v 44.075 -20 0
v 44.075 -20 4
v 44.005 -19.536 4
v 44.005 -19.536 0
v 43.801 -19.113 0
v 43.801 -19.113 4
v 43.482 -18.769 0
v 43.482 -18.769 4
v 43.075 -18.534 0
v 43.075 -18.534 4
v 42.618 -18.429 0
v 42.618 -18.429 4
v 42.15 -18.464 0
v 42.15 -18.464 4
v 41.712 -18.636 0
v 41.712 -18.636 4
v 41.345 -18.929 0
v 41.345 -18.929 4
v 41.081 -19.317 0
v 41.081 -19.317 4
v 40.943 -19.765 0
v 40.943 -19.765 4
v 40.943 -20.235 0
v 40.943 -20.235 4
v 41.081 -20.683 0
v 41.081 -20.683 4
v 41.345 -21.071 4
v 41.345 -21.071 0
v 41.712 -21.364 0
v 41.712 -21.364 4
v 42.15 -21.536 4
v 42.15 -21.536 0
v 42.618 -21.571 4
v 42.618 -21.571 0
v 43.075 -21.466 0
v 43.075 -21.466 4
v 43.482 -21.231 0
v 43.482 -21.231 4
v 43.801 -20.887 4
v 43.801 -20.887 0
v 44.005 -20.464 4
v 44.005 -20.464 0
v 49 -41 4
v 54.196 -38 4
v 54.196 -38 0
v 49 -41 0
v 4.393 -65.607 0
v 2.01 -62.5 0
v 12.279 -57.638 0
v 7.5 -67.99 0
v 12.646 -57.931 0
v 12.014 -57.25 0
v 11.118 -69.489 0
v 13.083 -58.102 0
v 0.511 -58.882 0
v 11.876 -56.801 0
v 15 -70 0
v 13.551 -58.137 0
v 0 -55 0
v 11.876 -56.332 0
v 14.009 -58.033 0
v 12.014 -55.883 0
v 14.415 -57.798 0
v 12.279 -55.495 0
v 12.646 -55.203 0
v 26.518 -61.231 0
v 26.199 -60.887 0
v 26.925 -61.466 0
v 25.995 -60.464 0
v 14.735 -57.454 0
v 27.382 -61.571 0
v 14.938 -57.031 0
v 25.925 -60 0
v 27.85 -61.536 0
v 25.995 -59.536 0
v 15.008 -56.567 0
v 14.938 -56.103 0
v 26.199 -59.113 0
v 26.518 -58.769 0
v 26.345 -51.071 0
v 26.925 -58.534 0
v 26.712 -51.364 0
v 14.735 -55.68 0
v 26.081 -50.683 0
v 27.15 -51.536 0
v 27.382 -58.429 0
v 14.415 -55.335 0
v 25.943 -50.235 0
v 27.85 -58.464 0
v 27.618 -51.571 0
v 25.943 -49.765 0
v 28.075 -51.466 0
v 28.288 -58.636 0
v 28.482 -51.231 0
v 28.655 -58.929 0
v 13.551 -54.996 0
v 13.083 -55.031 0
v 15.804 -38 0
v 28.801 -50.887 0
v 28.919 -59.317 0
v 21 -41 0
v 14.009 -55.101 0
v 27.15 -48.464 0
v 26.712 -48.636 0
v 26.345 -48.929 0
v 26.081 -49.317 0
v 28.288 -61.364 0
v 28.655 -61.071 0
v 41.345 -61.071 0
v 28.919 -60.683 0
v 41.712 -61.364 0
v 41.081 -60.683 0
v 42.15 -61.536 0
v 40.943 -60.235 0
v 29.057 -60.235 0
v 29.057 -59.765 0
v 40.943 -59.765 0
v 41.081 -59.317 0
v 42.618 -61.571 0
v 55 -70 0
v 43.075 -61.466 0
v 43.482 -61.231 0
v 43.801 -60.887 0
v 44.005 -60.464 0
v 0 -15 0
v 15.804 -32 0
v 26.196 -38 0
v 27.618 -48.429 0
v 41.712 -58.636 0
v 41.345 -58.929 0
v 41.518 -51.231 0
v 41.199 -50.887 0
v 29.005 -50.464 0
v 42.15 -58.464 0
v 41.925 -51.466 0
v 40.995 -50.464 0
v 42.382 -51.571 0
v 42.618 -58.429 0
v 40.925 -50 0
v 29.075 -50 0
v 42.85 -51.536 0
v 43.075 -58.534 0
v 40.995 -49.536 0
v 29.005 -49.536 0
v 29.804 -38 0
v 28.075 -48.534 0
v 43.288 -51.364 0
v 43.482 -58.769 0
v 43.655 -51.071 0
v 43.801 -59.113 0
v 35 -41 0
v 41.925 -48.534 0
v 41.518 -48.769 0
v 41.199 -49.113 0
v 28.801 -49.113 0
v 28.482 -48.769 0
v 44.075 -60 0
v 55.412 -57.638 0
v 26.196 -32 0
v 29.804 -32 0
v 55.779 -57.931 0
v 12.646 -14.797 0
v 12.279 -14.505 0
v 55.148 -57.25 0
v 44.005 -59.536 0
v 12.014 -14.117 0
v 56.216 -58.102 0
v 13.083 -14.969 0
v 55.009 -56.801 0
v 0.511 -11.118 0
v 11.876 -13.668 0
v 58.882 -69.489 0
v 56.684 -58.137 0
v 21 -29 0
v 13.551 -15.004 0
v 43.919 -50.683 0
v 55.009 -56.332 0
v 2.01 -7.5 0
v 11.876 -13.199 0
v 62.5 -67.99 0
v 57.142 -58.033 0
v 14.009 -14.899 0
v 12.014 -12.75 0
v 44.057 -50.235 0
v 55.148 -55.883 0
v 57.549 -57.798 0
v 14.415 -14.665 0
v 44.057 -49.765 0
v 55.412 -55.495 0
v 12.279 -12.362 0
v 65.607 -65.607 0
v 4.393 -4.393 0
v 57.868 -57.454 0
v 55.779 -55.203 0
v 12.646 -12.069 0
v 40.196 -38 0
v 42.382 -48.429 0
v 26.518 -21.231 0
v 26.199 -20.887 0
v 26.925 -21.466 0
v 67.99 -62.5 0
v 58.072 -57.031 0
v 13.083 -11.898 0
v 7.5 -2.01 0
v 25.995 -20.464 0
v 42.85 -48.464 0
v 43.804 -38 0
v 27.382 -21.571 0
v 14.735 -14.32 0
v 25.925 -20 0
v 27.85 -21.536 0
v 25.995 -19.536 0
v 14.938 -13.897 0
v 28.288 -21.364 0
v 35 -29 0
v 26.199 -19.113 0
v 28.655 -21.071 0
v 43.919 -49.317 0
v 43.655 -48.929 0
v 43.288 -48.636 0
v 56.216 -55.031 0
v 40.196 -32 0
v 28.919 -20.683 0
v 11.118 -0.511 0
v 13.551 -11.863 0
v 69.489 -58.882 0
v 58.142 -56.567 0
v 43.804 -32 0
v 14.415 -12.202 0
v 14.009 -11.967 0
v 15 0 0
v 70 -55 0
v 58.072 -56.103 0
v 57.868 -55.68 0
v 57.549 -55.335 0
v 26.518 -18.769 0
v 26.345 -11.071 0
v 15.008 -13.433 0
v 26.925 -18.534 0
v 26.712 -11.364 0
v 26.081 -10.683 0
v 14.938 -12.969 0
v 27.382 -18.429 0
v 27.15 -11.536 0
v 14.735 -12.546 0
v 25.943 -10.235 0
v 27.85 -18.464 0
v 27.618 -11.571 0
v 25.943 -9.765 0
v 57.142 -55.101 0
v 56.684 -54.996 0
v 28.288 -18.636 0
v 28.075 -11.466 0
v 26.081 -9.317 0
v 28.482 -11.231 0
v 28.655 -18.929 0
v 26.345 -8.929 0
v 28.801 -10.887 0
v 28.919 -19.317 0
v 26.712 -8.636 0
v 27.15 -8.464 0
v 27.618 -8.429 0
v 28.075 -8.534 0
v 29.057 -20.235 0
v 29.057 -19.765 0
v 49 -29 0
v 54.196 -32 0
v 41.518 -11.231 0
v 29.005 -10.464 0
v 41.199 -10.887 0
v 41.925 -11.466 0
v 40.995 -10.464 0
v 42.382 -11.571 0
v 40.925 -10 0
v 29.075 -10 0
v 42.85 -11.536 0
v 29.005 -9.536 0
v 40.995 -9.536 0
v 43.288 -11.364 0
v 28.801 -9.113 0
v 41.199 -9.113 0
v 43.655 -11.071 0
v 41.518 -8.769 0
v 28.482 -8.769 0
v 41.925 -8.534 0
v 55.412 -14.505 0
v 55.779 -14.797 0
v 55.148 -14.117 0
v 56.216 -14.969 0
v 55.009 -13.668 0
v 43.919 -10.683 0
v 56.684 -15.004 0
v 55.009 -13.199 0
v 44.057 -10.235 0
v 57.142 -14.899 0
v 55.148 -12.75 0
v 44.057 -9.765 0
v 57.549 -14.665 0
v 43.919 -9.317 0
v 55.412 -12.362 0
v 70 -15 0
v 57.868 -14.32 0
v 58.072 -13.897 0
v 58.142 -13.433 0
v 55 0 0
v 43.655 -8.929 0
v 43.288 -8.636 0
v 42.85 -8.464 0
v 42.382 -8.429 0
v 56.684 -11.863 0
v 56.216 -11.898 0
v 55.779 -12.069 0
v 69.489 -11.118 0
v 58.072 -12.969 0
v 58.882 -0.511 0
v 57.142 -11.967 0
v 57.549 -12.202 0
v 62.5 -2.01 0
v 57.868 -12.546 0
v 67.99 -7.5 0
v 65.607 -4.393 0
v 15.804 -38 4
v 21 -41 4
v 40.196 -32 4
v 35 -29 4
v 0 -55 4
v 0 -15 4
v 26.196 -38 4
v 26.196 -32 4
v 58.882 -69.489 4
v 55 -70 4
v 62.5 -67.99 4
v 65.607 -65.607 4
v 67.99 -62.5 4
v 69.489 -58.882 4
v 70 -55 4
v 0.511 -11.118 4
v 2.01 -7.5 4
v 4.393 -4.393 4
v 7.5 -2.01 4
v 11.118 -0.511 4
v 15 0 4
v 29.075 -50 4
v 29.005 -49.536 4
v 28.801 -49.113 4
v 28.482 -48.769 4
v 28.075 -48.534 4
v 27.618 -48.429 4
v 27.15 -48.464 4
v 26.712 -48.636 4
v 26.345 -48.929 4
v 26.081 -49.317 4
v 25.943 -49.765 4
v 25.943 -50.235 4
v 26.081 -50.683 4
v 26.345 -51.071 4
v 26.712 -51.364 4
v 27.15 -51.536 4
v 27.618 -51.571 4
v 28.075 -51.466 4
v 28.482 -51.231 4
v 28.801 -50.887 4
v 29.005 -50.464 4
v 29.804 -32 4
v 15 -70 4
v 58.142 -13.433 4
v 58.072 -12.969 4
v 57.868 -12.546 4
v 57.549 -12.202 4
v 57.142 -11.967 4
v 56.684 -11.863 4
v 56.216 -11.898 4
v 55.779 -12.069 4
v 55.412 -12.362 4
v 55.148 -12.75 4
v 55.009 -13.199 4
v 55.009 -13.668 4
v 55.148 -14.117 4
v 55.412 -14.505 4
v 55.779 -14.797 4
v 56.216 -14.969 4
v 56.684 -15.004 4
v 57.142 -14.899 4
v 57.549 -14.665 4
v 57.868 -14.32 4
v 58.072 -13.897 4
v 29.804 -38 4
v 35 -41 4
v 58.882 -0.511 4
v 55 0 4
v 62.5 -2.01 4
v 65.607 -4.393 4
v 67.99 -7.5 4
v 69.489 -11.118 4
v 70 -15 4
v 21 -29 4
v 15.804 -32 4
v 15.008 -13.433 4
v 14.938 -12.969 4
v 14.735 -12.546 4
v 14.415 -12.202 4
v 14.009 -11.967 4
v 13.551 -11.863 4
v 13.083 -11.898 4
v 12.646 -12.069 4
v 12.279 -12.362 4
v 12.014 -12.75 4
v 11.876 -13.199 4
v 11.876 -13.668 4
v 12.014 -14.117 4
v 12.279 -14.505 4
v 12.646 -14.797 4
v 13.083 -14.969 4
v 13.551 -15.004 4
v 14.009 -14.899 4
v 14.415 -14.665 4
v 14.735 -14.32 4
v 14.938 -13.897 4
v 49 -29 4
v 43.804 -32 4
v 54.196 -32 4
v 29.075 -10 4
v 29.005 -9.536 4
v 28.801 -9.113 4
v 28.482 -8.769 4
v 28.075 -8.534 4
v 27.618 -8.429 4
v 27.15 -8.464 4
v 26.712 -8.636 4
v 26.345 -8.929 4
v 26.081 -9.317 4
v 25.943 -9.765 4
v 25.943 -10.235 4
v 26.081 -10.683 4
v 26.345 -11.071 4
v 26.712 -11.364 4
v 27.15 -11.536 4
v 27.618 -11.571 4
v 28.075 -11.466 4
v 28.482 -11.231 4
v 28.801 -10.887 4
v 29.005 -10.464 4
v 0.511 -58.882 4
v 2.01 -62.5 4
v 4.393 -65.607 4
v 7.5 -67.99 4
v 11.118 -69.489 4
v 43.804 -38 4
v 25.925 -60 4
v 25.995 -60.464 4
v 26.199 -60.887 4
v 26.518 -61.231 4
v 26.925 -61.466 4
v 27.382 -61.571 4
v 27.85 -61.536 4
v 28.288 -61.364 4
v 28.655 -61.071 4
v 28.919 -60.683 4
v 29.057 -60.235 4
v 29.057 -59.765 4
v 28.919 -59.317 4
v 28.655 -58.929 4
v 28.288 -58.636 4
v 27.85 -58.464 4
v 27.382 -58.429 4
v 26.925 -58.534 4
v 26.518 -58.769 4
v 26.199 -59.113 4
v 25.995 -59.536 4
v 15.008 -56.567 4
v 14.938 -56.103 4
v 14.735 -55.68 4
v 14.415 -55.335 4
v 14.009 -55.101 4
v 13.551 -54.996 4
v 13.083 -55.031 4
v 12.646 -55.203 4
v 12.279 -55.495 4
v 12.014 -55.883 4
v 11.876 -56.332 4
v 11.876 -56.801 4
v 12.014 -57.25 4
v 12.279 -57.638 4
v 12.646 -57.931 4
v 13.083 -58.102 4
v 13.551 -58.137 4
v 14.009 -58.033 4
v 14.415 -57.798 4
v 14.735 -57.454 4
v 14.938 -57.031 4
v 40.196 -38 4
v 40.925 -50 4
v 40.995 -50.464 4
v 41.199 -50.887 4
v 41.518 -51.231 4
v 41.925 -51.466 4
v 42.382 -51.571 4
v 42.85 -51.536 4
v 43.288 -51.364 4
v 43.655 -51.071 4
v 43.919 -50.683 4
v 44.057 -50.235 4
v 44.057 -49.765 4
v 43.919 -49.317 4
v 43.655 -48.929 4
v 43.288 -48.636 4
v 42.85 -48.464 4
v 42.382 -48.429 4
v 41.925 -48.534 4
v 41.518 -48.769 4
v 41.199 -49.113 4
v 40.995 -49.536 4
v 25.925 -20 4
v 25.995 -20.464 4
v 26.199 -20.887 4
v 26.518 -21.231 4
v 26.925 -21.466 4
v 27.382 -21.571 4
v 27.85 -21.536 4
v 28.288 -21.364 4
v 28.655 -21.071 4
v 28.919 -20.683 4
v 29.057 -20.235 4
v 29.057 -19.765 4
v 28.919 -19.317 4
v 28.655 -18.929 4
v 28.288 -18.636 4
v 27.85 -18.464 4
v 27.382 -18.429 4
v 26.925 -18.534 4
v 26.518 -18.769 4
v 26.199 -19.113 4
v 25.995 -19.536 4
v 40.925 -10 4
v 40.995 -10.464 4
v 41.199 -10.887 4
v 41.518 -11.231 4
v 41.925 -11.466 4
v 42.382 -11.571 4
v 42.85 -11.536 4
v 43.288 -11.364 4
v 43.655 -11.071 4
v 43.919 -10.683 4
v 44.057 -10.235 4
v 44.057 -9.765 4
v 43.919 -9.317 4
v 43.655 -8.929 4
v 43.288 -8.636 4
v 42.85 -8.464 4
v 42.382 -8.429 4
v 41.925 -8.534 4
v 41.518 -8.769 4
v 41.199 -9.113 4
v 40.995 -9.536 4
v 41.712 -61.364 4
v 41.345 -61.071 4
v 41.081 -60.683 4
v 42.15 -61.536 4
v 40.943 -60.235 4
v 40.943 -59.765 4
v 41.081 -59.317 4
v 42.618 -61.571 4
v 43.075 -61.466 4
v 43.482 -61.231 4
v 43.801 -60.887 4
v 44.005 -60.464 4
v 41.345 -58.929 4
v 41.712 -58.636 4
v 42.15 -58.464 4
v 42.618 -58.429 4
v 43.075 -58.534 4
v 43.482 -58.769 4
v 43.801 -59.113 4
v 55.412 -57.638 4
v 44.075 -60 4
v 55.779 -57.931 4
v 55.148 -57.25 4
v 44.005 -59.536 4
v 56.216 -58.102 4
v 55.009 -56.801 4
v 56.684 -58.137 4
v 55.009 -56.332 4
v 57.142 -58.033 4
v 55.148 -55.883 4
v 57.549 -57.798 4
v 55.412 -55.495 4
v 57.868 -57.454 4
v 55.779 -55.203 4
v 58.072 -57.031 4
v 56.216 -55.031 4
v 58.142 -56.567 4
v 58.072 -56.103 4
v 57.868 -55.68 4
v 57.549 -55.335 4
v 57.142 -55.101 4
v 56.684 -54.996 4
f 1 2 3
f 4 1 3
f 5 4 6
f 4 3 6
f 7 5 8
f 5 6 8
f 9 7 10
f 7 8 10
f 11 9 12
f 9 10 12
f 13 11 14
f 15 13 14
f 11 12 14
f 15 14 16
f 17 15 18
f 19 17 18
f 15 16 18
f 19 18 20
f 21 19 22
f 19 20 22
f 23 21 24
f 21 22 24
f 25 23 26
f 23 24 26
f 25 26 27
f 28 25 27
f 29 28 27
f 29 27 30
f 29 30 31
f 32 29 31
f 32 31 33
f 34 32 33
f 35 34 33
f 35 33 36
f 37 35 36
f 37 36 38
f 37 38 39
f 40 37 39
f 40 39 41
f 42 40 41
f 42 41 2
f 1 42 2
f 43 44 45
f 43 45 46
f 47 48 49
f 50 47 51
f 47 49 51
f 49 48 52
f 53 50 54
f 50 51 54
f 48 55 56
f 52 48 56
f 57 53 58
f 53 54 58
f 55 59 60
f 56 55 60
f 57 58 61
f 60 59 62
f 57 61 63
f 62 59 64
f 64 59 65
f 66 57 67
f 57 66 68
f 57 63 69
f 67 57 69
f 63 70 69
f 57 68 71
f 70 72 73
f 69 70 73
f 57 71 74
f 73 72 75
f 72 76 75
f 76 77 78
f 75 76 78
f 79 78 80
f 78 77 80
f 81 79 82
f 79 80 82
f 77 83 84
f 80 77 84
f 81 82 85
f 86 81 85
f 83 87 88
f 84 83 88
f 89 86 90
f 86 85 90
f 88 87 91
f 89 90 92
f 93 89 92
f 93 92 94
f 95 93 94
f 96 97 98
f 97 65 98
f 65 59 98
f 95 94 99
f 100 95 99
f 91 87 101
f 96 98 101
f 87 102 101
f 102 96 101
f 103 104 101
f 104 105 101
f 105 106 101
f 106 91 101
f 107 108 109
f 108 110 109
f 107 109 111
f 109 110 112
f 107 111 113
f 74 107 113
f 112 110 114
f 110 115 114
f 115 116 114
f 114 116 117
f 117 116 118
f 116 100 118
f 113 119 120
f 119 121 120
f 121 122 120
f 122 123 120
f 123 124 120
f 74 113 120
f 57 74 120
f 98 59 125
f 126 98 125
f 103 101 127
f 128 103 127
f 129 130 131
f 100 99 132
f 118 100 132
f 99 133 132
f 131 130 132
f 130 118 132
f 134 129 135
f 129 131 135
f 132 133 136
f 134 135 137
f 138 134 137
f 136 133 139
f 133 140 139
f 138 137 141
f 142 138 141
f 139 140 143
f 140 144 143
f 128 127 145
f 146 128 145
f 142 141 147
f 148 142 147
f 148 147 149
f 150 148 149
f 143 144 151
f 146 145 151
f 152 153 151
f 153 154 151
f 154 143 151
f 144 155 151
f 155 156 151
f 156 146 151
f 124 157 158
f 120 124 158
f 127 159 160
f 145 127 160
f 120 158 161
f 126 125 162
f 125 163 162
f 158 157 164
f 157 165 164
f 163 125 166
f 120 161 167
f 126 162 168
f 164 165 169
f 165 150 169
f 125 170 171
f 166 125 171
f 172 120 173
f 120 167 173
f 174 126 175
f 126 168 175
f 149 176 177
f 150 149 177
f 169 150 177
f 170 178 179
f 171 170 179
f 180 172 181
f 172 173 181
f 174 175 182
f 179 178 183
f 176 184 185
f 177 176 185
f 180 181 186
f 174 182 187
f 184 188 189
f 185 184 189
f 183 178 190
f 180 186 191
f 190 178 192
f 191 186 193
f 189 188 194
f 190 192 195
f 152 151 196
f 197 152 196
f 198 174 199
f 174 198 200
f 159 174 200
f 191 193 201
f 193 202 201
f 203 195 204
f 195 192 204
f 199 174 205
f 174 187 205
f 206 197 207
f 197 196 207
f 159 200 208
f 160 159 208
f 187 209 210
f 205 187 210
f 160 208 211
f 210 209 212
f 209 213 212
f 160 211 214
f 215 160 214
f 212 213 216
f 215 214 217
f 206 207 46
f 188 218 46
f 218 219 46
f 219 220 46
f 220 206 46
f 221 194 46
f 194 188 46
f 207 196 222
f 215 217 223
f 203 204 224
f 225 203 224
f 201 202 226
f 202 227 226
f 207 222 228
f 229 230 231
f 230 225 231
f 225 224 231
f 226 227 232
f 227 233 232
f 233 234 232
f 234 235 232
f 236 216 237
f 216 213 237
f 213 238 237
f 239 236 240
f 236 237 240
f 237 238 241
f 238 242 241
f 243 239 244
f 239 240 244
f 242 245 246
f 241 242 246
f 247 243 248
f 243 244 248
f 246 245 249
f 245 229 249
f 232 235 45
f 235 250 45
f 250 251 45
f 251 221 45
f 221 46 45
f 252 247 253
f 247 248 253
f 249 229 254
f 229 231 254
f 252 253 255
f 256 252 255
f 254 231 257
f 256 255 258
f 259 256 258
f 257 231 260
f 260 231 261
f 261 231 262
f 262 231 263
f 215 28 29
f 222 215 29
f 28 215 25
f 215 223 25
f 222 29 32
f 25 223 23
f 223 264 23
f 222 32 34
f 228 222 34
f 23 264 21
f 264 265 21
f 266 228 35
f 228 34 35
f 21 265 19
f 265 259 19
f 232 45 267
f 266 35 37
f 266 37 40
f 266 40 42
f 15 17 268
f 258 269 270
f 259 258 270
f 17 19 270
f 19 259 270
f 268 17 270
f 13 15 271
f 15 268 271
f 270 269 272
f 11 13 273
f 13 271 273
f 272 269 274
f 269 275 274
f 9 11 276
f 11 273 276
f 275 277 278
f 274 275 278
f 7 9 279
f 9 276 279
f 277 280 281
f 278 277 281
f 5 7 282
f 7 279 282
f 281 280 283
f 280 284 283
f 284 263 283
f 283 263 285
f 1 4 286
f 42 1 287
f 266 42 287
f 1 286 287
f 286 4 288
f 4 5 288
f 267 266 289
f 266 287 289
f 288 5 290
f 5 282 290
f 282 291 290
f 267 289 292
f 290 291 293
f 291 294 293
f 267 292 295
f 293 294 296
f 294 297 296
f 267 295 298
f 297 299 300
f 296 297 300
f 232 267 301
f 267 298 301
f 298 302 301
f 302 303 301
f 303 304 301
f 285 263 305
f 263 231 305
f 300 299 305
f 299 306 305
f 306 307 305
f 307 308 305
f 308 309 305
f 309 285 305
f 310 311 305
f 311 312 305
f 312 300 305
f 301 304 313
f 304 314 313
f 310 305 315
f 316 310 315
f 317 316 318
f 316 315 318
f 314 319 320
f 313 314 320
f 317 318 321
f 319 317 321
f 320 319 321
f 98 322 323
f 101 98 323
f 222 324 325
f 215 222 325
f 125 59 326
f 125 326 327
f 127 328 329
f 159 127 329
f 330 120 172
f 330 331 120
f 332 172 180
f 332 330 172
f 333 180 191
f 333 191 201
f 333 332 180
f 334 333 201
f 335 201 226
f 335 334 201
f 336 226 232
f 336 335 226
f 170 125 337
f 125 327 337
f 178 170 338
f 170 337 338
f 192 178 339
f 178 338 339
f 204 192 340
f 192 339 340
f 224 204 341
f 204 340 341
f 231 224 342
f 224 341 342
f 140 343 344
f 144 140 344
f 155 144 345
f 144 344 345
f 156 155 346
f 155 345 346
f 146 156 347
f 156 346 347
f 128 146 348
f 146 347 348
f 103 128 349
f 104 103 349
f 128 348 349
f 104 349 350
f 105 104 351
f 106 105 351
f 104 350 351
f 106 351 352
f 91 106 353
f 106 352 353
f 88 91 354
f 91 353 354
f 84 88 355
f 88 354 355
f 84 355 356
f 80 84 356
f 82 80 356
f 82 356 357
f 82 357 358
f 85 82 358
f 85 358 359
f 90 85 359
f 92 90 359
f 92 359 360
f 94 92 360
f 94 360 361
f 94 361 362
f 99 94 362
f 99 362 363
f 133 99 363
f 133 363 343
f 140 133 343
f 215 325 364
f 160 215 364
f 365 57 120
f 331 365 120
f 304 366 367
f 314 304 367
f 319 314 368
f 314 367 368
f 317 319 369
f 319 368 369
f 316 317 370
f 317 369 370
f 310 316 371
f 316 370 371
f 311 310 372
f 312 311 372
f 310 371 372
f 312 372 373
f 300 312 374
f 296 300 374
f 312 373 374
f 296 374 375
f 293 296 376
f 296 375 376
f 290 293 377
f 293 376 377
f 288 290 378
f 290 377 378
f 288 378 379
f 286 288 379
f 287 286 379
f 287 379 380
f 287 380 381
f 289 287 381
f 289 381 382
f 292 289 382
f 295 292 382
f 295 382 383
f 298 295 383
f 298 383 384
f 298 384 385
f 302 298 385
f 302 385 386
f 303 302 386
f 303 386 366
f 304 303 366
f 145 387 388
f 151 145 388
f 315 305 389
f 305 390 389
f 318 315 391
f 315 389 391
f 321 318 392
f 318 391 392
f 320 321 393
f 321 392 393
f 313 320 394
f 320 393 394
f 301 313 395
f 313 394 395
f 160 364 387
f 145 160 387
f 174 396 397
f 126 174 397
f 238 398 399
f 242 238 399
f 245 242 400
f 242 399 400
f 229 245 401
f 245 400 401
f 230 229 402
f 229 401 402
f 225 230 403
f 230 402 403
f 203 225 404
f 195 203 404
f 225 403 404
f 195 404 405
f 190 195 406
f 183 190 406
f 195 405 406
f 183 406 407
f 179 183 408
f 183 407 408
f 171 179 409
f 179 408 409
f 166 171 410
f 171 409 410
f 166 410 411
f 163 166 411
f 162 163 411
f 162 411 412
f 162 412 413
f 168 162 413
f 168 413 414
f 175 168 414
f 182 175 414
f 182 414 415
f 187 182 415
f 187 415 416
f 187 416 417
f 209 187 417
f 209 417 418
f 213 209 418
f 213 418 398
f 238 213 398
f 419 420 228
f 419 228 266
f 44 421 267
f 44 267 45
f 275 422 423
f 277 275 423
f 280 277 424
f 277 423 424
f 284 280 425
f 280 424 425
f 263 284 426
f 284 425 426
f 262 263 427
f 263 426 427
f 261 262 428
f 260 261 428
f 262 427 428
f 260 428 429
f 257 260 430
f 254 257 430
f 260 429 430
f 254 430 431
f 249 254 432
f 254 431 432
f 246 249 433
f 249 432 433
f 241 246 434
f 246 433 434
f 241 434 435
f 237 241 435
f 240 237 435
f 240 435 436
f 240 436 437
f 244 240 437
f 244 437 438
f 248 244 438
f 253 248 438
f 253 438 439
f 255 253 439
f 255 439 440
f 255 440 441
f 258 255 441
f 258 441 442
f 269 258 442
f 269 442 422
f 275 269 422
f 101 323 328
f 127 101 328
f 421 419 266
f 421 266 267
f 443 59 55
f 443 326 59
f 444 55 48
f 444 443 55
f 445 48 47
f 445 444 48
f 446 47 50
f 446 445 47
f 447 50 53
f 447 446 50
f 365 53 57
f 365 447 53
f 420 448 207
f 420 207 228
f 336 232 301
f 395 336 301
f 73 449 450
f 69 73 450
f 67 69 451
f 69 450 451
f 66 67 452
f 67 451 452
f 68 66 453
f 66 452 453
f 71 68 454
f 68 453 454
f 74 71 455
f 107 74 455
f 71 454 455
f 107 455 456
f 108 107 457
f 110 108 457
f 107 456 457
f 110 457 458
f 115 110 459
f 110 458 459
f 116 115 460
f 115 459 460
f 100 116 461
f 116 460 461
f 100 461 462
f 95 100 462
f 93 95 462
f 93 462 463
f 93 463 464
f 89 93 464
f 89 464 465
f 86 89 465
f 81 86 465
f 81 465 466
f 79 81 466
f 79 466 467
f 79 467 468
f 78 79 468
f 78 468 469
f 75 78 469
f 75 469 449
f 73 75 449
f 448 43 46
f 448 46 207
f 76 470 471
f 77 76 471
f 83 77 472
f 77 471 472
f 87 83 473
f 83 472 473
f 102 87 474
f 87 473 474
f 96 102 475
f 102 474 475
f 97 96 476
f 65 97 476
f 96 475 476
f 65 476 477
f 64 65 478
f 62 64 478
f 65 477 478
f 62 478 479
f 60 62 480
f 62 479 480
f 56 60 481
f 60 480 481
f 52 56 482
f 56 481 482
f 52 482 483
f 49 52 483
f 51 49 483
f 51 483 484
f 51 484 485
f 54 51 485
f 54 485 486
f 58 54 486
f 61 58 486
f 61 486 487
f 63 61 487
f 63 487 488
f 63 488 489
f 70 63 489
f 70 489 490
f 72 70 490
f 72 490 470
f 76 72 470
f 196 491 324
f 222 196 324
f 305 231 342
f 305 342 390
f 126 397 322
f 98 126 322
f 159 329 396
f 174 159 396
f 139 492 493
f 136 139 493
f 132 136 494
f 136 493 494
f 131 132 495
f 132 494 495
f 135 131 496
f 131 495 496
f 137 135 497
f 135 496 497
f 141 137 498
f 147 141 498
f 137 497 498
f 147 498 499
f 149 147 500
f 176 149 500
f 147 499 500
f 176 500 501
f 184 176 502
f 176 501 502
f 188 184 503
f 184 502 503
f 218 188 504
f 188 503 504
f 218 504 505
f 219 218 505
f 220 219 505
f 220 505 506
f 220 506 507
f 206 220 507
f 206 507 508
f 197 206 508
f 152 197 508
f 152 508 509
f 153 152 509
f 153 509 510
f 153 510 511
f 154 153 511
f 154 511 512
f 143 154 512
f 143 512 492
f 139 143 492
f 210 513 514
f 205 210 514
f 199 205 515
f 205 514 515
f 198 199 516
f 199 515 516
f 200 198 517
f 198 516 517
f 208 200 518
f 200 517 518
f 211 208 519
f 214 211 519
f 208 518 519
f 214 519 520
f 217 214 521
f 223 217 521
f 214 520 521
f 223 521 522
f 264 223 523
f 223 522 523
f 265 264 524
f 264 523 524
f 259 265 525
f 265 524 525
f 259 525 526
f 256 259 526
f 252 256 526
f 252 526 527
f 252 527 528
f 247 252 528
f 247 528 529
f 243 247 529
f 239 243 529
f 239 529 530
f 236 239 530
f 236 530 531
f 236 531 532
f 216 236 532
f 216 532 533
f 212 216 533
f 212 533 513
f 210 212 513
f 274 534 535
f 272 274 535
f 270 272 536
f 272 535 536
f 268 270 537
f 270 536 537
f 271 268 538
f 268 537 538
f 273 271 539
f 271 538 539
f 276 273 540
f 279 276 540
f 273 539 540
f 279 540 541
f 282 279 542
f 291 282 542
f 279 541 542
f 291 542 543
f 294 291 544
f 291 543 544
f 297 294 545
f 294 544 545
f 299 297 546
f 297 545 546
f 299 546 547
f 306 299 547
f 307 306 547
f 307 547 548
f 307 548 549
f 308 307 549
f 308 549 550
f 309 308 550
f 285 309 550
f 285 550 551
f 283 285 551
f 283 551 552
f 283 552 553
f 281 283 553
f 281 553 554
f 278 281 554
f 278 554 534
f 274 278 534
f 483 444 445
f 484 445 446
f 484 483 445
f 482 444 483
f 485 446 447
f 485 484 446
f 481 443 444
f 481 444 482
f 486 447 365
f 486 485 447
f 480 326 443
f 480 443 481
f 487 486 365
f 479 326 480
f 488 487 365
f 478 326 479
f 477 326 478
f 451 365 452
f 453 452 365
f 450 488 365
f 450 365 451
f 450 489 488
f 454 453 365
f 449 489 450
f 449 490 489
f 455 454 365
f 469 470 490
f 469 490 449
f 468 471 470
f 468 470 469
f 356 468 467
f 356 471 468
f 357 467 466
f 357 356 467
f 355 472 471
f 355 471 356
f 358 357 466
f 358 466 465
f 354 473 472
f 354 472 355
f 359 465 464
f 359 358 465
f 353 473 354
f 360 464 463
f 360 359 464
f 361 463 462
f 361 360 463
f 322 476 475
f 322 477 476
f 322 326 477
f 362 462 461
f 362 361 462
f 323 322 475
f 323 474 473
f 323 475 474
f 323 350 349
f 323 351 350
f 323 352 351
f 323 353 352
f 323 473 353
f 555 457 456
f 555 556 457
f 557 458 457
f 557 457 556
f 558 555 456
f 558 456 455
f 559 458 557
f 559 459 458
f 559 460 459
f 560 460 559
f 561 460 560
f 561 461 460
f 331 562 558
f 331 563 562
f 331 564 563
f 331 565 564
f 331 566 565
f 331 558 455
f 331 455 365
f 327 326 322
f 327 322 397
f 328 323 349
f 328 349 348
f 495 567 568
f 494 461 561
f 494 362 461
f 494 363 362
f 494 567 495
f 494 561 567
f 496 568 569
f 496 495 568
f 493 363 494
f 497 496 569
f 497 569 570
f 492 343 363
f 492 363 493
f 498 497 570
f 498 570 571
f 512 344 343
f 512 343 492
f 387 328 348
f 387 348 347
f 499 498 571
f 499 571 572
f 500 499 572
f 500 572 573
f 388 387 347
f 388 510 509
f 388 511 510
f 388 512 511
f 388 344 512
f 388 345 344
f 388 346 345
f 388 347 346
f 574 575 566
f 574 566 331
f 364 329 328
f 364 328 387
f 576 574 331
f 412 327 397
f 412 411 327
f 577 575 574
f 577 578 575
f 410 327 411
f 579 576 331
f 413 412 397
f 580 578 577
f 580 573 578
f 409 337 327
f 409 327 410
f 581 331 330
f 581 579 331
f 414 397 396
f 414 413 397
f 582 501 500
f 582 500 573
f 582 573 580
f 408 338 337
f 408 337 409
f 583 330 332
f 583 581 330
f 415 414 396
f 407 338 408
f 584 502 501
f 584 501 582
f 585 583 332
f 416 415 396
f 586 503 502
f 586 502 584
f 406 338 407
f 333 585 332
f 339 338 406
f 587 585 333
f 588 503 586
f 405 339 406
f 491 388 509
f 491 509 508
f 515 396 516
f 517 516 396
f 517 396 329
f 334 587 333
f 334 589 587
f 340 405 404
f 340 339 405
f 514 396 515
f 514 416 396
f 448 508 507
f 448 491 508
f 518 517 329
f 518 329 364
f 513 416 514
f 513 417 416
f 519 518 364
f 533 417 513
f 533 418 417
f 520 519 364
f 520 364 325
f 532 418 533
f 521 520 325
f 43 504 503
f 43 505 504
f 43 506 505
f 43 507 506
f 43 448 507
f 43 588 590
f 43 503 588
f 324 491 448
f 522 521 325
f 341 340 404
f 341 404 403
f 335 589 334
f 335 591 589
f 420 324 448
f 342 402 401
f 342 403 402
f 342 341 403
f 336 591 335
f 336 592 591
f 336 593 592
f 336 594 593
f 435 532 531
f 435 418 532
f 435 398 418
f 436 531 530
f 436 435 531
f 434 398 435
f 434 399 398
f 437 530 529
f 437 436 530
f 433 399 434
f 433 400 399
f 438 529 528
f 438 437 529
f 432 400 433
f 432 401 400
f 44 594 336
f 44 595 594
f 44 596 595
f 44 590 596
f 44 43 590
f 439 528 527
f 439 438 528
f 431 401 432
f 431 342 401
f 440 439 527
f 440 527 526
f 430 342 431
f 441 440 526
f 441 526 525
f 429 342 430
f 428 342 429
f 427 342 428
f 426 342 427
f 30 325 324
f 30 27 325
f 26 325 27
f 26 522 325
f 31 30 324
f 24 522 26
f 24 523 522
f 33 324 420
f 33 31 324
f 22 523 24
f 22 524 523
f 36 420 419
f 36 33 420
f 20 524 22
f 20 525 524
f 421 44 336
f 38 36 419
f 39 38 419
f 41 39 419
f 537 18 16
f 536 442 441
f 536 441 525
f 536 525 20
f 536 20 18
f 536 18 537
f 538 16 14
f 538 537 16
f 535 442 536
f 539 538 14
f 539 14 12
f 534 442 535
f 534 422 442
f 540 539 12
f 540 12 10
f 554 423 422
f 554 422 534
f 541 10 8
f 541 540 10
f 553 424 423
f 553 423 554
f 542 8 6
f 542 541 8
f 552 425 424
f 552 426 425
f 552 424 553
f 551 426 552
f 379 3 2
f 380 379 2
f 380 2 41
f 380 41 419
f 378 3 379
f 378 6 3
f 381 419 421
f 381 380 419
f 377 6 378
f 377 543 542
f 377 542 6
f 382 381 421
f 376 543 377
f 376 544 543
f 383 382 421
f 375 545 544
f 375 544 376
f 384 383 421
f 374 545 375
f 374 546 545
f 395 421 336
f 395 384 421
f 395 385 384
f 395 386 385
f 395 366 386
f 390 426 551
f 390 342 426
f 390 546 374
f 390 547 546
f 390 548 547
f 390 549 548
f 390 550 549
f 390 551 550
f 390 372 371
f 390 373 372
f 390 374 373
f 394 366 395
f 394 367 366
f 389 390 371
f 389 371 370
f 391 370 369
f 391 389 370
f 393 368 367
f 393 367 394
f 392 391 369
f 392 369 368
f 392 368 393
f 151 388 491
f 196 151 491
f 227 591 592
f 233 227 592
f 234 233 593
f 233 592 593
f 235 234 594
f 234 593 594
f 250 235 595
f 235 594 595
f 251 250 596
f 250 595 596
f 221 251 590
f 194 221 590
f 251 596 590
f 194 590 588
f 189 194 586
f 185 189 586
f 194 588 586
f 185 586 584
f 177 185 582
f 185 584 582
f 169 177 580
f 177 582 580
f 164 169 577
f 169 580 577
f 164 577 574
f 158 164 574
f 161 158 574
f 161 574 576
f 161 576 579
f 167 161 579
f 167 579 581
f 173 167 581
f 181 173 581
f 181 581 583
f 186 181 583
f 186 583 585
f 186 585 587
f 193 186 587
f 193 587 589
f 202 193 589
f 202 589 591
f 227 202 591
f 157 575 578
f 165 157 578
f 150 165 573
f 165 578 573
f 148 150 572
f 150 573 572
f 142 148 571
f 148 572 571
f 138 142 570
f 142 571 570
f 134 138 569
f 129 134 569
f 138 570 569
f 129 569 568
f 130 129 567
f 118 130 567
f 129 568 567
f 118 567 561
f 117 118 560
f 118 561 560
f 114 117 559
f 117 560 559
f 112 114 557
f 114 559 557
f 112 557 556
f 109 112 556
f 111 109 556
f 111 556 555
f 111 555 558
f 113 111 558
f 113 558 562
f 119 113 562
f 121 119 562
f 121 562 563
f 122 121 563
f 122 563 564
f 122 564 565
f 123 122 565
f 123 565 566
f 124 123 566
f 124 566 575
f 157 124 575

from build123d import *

# Parameters (mm, degrees)
SKETCH_1_W          = 70
SKETCH_1_H          = 70
EXTRUDE_1_DEPTH     = 4
SKETCH_2_R          = 1.575
CUT_EXTRUDE_1_DEPTH = 100.075728612
FILLET_1_R          = 15


with BuildPart() as part:
    # 草图1 → 凸台-拉伸1 (new body)
    with BuildSketch(Plane.XY):
        with Locations((35, -35)):
            Rectangle(SKETCH_1_W, SKETCH_1_H)
    extrude(amount=EXTRUDE_1_DEPTH)

    # 草图2 → 切除-拉伸1 (cut, through all)
    with BuildSketch(Plane.XY.offset(4)):
        with Locations((27.5, -10)):
            Circle(SKETCH_2_R)
        with Locations(Location((42.5, -10, 0), (0, 0, 180))):
            Circle(SKETCH_2_R)
        with Locations((42.5, -20)):
            Circle(SKETCH_2_R)
        with Locations(Location((27.5, -20, 0), (0, 0, 180))):
            Circle(SKETCH_2_R)
        with Locations((27.5, -50)):
            Circle(SKETCH_2_R)
        with Locations(Location((42.5, -50, 0), (0, 0, 180))):
            Circle(SKETCH_2_R)
        with Locations((42.5, -60)):
            Circle(SKETCH_2_R)
        with Locations(Location((27.5, -60, 0), (0, 0, 180))):
            Circle(SKETCH_2_R)
        with Locations((13.433243174, -13.433243174)):
            Circle(SKETCH_2_R)
        with Locations((56.566756826, -13.433243174)):
            Circle(SKETCH_2_R)
        with Locations((56.566756826, -56.566756826)):
            Circle(SKETCH_2_R)
        with Locations((13.433243174, -56.566756826)):
            Circle(SKETCH_2_R)
        Polygon((21, -29), (15.803847577, -32), (15.803847577, -38), (21, -41), (26.196152423, -38), (26.196152423, -32), align=None)
        Polygon((35, -41), (40.196152423, -38), (40.196152423, -32), (35, -29), (29.803847577, -32), (29.803847577, -38), align=None)
        Polygon((43.803847577, -38), (43.803847577, -32), (49, -29), (54.196152423, -32), (54.196152423, -38), (49, -41), align=None)
    extrude(amount=-CUT_EXTRUDE_1_DEPTH, mode=Mode.SUBTRACT)

    # 圆角1
    fillet_1_edges = [part.edges().sort_by_distance(p)[0] for p in [
        (0, 0, 2),
        (70, 0, 2),
        (70, -70, 2),
        (0, -70, 2),
    ]]
    fillet(fillet_1_edges, radius=FILLET_1_R)


solid = part.part
